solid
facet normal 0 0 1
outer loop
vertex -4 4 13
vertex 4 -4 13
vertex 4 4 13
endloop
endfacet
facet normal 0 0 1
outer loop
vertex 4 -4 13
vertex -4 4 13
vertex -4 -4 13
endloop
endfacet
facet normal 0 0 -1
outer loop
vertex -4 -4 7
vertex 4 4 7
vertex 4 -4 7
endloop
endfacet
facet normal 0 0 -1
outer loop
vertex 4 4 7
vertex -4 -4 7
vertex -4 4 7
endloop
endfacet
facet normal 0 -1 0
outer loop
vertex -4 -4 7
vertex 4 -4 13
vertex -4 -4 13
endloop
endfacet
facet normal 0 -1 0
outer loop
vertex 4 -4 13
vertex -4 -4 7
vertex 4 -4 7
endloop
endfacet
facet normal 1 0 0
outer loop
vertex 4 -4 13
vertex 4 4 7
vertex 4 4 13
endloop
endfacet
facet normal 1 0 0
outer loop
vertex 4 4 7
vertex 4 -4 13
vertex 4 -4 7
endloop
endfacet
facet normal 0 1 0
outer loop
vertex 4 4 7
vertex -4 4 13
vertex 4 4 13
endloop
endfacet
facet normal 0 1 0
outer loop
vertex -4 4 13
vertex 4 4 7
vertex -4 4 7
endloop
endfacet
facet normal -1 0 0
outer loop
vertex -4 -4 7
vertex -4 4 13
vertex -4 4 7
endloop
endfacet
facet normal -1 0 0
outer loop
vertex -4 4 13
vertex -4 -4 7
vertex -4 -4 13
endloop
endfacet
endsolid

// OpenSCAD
// Bulldozer Cabin
body_width = 12;
body_length = 16;
body_height = 5;
tread_height = 4;

cabin_width = 8;
cabin_length = 8;
cabin_height = 6;

// Cabin
translate([-cabin_width/2, -cabin_length/2, body_height + tread_height/2])
    cube([cabin_width, cabin_length, cabin_height]);
